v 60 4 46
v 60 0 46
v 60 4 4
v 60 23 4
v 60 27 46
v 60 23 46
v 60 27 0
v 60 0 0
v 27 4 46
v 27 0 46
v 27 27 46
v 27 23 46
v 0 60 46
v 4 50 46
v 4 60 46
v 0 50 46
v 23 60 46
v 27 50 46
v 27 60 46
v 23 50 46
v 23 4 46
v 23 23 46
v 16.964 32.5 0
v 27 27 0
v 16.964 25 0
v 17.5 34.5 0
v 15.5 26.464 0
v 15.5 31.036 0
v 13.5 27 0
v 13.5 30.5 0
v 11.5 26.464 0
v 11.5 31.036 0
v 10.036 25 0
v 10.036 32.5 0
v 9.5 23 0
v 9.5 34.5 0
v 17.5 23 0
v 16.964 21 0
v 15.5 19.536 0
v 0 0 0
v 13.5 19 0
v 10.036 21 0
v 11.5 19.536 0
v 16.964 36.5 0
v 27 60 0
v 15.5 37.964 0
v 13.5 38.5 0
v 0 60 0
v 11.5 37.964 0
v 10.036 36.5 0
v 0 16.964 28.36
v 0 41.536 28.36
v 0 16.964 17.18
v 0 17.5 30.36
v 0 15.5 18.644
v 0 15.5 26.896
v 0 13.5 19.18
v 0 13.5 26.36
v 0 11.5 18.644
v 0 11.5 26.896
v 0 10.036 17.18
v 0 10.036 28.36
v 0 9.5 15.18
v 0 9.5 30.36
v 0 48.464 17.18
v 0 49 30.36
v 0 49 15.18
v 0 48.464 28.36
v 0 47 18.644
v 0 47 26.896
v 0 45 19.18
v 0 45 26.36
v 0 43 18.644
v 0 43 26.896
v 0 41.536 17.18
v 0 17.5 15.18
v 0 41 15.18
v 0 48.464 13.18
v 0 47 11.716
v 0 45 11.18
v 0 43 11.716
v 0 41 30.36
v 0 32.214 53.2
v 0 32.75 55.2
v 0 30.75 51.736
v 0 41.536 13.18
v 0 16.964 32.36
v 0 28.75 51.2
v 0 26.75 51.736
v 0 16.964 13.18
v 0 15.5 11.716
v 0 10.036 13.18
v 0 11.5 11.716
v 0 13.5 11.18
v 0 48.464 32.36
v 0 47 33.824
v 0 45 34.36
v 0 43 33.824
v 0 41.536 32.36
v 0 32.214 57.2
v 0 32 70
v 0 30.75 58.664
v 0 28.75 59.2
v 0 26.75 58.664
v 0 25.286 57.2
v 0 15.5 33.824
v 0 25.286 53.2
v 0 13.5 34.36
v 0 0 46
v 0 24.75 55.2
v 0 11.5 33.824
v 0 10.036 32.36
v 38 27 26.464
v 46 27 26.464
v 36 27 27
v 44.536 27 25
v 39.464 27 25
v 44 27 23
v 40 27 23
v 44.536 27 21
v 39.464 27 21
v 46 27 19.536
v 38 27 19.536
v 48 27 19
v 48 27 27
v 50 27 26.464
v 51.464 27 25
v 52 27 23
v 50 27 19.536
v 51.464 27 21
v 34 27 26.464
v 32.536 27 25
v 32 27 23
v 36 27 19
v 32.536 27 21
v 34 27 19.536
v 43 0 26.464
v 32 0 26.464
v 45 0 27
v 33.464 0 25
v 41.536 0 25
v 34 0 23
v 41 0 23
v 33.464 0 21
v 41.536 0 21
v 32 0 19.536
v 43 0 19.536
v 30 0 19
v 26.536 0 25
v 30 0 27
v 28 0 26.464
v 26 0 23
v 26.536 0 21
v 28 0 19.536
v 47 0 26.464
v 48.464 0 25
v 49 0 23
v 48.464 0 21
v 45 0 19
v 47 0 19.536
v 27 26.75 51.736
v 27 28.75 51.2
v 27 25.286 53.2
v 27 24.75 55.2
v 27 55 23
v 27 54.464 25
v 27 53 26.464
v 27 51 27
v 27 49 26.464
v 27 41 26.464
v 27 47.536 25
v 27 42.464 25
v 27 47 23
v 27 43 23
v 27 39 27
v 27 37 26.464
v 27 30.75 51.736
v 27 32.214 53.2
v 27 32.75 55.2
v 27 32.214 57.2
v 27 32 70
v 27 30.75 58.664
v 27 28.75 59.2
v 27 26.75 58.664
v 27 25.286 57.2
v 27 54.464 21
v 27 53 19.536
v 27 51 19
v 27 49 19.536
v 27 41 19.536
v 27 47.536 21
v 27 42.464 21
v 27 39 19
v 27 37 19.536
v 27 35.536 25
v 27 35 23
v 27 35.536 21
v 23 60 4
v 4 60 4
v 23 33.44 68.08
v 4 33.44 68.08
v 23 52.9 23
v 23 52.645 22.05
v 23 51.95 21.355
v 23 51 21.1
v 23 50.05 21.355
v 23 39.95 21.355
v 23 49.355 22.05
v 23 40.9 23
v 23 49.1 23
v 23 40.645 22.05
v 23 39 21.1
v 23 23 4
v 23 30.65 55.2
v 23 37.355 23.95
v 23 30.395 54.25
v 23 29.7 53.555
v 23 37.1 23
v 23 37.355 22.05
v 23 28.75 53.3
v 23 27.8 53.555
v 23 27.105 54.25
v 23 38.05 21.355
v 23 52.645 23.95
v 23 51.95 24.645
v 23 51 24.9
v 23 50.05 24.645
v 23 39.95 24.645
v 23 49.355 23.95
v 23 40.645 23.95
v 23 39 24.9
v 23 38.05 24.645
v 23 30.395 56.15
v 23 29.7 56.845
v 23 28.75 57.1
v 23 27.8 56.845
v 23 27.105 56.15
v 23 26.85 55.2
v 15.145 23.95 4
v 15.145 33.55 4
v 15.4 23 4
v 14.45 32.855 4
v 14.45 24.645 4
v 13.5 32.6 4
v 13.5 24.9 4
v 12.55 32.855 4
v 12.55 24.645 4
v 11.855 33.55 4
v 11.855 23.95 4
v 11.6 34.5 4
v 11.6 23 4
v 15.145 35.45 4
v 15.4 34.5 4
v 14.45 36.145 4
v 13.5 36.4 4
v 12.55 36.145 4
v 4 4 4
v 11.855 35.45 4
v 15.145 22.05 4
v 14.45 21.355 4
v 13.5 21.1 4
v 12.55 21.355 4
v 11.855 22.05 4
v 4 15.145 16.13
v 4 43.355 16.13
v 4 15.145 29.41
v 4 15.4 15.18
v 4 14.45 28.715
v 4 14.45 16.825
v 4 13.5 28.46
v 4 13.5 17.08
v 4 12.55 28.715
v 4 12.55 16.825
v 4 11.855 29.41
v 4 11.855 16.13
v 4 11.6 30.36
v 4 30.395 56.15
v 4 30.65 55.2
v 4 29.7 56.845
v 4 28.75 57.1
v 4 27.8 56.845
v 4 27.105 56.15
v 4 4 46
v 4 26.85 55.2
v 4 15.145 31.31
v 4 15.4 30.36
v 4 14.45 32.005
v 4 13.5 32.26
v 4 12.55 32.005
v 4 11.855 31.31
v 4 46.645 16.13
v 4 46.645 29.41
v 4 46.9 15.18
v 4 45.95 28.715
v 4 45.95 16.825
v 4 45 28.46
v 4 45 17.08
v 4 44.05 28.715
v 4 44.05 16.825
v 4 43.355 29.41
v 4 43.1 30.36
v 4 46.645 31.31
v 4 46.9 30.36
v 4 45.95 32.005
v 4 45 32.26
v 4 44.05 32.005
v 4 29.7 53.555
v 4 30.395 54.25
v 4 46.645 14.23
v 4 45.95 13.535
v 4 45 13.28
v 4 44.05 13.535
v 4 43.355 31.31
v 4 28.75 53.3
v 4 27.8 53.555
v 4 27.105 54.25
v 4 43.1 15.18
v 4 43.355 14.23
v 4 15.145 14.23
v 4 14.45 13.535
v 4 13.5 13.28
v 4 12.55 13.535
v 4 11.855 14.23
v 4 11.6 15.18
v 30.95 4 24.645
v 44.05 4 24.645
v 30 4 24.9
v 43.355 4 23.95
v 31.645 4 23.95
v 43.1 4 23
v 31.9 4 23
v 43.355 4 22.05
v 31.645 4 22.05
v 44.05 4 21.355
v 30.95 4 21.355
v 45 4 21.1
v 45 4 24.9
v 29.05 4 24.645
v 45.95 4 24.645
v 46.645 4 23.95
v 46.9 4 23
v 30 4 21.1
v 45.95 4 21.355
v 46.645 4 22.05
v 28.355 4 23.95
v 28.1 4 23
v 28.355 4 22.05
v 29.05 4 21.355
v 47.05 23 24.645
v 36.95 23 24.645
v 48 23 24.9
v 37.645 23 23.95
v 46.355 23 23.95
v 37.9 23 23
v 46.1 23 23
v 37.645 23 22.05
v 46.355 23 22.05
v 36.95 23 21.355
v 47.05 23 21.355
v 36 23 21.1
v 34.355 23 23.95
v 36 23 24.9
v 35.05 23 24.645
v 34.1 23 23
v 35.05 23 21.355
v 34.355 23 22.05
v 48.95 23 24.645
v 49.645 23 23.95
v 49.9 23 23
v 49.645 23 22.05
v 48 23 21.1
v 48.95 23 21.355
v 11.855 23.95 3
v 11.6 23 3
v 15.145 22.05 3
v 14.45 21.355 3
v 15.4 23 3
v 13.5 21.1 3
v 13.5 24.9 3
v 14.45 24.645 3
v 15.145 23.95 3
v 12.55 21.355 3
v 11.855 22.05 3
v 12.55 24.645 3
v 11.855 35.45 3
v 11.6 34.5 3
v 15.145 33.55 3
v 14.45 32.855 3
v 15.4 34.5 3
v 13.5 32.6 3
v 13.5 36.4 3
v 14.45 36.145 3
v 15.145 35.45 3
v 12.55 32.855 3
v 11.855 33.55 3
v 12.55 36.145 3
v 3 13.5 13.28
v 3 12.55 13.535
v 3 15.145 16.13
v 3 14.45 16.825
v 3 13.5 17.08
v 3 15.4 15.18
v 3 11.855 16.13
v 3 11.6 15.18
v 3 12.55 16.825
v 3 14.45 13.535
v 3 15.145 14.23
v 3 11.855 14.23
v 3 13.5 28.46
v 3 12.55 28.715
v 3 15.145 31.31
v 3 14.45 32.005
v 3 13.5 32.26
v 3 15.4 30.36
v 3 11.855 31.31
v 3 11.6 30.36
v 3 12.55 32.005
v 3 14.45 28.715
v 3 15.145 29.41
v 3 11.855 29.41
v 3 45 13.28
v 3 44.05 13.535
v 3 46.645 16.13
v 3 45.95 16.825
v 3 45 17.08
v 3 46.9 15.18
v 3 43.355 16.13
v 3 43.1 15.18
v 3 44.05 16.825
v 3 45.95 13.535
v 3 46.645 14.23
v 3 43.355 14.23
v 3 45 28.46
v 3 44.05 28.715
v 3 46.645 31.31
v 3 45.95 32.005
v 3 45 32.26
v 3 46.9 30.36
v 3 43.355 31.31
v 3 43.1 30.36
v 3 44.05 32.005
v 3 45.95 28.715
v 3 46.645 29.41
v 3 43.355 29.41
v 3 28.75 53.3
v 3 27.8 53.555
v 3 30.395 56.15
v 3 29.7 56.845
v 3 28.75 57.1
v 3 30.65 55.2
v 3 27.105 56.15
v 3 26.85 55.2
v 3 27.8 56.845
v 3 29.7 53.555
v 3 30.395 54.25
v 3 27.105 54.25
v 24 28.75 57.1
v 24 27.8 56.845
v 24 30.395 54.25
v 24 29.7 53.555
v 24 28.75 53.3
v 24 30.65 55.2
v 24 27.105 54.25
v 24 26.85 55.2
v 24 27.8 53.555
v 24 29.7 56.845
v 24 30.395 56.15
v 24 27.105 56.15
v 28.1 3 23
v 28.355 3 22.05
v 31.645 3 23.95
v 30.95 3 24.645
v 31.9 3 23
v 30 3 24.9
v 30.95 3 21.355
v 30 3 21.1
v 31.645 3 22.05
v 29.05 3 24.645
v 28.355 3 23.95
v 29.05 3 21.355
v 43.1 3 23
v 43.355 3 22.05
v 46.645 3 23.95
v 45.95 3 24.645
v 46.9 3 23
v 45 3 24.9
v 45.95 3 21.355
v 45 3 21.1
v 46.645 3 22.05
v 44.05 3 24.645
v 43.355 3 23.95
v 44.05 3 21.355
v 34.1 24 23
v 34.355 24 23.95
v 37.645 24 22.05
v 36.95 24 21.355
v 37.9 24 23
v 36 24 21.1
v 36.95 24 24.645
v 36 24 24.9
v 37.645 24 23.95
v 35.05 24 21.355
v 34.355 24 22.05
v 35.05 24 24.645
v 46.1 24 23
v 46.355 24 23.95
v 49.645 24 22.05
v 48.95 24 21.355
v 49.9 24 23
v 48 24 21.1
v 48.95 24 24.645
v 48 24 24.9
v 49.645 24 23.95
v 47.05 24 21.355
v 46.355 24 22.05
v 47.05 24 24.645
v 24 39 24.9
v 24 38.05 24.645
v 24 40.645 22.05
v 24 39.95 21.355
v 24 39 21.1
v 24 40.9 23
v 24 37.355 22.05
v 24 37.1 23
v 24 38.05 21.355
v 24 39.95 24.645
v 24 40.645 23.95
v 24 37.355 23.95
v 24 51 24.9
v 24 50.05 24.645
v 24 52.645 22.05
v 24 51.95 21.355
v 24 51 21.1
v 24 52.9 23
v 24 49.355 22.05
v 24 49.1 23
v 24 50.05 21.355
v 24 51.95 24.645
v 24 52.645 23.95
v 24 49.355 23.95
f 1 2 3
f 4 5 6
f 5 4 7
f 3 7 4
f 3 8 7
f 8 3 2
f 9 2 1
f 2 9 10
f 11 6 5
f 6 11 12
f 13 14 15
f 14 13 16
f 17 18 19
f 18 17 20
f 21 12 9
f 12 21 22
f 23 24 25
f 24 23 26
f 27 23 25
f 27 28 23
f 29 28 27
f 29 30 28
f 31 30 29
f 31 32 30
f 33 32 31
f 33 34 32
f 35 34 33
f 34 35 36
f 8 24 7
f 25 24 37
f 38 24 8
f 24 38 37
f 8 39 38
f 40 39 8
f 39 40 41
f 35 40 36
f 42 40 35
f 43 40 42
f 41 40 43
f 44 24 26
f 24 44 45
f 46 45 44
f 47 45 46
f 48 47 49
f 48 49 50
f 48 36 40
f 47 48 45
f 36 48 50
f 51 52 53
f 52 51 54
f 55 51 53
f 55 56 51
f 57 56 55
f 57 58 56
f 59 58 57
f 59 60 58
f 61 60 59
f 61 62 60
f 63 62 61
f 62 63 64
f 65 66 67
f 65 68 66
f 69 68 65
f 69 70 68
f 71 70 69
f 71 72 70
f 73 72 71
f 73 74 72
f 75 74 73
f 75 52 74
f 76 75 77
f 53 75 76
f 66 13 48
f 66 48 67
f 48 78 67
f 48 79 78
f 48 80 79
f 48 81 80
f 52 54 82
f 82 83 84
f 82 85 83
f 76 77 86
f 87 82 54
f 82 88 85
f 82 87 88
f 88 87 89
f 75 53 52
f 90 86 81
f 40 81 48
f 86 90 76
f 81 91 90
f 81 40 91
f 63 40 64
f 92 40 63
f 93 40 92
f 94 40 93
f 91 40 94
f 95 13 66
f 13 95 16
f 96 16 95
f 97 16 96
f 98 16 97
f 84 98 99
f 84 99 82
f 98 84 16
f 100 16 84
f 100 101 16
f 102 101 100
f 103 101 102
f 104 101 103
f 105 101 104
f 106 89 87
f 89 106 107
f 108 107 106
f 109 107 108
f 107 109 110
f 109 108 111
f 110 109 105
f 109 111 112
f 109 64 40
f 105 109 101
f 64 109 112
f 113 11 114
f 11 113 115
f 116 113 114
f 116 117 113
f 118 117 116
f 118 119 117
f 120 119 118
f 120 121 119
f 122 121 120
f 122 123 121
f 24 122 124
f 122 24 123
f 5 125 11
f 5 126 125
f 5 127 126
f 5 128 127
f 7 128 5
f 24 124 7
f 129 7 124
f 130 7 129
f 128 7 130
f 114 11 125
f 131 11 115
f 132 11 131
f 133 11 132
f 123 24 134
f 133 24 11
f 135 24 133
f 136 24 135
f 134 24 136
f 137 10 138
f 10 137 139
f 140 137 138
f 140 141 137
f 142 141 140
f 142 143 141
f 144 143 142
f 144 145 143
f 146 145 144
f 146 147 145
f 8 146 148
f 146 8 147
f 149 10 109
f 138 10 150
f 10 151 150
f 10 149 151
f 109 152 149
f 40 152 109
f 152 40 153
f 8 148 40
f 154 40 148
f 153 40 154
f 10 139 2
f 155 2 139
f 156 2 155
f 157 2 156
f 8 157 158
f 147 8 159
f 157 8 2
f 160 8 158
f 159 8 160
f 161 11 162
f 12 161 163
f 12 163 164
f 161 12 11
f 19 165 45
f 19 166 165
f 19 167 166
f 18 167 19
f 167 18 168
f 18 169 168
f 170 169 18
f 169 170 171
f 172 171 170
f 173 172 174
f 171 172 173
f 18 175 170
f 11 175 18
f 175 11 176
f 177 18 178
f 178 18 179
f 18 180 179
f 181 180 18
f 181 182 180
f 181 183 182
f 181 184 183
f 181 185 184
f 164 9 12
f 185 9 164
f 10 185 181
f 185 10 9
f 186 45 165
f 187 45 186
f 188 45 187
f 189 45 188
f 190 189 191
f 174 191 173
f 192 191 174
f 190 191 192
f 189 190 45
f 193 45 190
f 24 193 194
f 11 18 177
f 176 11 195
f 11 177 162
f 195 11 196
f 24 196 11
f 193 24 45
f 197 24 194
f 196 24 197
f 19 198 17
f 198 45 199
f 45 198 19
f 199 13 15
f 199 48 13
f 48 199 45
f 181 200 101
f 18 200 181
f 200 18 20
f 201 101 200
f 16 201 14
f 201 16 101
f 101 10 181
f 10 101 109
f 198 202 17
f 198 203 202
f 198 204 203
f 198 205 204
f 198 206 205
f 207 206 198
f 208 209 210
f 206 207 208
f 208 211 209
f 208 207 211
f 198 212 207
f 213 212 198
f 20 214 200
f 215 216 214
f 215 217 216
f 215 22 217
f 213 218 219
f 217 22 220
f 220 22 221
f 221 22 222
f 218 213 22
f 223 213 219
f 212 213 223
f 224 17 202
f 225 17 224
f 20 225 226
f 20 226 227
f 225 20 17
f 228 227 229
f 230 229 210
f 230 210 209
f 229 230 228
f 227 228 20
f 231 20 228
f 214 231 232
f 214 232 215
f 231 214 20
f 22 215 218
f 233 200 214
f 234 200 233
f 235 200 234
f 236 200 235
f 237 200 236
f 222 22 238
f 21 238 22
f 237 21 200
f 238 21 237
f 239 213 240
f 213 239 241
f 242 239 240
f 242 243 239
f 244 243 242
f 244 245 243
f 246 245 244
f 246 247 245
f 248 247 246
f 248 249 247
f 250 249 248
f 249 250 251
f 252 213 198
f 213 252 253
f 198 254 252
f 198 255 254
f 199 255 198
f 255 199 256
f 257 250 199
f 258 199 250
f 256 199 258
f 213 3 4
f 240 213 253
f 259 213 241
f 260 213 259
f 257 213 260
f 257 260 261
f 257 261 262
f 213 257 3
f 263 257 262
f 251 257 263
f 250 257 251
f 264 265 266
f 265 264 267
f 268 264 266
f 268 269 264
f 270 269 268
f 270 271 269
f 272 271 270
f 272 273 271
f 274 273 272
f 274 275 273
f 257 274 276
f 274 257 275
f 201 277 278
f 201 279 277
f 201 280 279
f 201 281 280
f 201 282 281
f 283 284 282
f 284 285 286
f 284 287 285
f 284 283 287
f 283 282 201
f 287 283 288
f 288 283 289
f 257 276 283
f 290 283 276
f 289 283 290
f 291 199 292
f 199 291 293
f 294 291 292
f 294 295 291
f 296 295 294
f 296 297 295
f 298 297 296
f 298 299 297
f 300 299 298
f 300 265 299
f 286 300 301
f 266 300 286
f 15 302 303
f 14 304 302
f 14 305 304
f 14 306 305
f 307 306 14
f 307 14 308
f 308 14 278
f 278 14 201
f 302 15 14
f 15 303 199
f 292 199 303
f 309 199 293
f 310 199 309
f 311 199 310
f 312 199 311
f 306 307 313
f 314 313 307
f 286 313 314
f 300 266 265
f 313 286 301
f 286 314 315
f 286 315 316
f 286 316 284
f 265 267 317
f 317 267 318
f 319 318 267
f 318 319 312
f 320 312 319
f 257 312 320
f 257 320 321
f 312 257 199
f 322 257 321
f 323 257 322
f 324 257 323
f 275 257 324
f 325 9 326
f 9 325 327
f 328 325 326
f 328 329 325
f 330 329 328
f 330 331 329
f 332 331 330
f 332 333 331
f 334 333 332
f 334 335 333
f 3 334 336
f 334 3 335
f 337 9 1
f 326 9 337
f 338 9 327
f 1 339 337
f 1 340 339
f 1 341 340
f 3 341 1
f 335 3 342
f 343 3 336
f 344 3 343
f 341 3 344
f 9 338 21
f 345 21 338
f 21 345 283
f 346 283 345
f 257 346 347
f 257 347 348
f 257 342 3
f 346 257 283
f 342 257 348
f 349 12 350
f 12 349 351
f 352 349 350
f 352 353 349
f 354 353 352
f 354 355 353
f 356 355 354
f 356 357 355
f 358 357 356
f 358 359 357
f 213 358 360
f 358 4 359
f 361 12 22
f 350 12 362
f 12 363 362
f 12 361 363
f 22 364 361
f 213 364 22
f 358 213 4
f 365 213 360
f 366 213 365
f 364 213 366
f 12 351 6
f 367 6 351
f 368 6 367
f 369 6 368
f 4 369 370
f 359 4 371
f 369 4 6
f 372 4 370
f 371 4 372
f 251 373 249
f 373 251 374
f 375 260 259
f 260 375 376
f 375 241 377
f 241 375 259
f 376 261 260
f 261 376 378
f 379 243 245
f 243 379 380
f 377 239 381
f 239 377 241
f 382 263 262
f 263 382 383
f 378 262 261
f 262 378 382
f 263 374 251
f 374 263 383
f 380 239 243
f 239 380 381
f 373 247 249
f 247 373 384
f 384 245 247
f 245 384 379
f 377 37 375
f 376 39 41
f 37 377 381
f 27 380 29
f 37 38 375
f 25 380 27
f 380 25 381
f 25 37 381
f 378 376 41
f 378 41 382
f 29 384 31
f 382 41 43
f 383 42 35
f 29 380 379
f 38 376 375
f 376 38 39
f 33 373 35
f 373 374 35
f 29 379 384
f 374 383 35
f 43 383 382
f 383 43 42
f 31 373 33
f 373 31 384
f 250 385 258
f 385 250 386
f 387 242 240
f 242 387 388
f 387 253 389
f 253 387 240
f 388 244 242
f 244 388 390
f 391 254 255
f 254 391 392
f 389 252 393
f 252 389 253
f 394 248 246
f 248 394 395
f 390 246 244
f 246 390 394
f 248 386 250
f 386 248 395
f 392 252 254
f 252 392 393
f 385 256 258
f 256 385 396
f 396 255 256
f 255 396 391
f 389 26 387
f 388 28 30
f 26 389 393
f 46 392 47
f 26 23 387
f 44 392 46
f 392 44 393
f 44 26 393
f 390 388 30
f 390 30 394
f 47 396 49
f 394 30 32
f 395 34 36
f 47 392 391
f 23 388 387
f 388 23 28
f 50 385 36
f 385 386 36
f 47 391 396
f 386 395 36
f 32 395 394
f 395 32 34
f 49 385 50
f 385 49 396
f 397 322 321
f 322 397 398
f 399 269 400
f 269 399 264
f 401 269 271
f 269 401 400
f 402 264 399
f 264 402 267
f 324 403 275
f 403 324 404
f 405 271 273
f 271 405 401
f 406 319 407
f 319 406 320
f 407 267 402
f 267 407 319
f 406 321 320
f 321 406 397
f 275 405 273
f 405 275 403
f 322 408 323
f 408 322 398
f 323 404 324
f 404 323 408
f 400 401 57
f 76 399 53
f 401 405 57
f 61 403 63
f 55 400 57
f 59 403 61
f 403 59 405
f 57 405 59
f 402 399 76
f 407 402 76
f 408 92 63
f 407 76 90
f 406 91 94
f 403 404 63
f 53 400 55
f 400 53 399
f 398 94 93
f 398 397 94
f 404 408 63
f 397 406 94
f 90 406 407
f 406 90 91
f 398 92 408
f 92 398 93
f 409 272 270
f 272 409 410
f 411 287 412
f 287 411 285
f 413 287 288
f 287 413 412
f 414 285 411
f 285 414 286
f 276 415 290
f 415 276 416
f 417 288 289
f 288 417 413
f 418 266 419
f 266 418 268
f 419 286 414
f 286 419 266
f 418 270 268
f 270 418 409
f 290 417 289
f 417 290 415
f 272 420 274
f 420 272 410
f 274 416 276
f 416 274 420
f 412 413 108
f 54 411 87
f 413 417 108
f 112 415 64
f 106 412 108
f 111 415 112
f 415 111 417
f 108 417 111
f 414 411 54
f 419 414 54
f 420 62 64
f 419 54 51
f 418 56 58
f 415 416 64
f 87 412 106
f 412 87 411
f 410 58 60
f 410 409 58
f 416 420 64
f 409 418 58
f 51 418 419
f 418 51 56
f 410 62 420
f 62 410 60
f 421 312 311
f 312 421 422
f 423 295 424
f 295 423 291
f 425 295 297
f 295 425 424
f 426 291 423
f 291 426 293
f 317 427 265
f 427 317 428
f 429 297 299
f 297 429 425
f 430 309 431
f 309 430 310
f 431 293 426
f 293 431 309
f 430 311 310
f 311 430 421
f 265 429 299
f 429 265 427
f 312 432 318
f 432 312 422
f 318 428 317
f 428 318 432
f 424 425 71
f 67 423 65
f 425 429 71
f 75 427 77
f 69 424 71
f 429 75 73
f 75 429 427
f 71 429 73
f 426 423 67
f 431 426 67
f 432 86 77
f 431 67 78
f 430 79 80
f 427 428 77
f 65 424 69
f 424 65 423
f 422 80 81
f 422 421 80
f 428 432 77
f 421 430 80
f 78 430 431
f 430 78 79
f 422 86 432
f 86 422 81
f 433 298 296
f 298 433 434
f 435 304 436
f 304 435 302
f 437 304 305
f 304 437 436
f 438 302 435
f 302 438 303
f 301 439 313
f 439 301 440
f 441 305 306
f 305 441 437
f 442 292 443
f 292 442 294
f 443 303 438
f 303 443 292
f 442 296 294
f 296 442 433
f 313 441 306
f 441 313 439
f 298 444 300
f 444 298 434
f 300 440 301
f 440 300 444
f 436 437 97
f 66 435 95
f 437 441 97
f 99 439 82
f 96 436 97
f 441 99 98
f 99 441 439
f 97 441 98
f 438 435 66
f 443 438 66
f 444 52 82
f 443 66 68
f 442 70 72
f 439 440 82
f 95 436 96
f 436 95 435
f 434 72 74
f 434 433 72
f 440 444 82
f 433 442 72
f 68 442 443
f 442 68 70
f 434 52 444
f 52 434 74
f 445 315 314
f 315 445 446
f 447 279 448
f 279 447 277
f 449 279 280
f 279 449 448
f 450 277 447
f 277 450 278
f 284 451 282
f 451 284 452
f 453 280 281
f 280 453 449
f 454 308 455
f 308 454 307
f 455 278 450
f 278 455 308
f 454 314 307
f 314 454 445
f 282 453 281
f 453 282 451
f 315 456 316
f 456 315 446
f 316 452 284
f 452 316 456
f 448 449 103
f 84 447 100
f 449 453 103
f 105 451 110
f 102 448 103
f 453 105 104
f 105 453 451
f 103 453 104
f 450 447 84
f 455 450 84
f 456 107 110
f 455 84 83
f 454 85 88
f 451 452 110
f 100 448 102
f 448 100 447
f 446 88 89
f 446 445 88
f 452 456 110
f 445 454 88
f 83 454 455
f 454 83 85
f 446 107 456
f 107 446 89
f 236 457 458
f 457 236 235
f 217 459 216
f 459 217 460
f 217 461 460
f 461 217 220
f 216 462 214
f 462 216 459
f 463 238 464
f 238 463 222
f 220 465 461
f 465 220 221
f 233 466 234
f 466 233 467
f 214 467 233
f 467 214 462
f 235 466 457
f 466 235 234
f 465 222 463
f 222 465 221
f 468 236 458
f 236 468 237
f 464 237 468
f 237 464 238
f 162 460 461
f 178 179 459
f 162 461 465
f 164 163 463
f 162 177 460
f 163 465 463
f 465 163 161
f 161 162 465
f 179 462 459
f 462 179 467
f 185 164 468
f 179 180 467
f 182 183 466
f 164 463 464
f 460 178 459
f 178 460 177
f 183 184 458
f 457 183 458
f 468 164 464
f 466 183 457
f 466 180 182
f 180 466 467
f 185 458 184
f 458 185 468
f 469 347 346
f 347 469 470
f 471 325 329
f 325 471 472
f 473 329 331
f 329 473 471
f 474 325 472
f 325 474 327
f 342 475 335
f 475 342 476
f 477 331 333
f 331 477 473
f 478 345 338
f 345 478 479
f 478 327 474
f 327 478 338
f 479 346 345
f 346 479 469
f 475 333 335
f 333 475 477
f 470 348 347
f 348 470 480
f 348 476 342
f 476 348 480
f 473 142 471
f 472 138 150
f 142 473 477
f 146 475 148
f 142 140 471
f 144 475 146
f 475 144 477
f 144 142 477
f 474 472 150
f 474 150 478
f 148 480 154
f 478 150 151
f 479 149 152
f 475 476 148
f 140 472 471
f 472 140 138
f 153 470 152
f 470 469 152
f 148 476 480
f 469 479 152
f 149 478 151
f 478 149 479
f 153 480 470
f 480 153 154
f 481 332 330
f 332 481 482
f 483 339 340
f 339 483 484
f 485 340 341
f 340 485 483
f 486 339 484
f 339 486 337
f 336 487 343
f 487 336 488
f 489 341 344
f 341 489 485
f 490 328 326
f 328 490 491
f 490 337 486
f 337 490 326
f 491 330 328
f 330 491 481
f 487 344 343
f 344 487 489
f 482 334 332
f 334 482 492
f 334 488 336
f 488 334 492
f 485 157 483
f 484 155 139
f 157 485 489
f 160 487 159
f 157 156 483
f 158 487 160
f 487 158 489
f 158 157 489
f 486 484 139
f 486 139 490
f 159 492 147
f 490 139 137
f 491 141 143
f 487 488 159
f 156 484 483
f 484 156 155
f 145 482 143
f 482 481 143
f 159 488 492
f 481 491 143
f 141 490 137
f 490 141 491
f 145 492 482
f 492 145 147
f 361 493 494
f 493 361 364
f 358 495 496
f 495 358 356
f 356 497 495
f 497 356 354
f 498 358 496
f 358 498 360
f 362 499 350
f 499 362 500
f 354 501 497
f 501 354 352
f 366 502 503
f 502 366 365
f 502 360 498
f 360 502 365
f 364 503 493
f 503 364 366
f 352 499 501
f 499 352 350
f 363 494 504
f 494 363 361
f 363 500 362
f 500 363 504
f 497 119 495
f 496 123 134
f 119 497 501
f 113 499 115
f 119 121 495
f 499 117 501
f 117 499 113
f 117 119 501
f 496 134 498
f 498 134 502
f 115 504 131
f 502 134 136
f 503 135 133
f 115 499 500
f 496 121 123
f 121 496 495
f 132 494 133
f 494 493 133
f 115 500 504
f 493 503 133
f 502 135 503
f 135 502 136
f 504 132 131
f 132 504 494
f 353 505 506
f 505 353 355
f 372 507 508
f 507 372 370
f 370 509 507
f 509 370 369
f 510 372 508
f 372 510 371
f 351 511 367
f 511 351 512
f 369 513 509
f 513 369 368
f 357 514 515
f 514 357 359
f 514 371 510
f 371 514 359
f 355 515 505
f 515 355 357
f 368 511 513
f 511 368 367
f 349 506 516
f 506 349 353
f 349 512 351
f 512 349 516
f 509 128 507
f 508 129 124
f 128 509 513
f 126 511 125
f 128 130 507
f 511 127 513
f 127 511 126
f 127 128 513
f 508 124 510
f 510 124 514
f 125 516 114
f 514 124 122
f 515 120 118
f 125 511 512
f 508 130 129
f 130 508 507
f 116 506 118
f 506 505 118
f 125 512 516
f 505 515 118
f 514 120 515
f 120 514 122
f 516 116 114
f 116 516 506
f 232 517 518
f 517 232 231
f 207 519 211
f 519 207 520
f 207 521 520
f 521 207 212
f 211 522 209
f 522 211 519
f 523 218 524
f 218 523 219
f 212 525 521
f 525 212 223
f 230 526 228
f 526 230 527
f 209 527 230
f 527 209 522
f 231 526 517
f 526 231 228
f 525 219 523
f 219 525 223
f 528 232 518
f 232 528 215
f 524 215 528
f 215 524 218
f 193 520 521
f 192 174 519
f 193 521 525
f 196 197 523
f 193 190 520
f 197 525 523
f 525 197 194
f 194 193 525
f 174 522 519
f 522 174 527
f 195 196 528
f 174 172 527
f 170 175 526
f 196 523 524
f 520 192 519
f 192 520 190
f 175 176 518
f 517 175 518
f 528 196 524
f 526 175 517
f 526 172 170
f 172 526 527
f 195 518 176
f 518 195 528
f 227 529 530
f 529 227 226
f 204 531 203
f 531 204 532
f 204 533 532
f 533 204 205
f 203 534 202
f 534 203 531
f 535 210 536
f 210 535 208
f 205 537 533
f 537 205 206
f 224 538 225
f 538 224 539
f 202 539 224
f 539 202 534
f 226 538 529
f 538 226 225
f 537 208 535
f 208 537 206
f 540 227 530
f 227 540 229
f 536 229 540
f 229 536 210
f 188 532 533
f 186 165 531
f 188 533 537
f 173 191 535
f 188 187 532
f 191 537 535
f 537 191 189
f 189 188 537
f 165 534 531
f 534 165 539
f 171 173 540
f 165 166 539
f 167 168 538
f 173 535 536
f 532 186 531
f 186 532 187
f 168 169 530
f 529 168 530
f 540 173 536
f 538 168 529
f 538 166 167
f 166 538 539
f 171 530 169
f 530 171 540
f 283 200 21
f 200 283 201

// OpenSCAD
difference(){
	union() {
		cube(size = [60, 27, 46]);
		cube(size = [27, 60, 46]);
		translate(v = [0, 0, 46]) {
			rotate(a = -53.1300000000, v = [1, 0, 0]) {
				translate(v = [0, 0, 0]) {
					cube(size = [27, 36, 40]);
				}
			}
		}
		translate(v = [13.5000000000, 23.0000000000, 0]) {
			rotate(a = 180, v = [1, 0, 0]) {
			}
		}
		translate(v = [13.5000000000, 34.5000000000, 0]) {
			rotate(a = 180, v = [1, 0, 0]) {
			}
		}
		translate(v = [0, 13.5000000000, 15.1800000000]) {
			rotate(a = -90, v = [0, 1, 0]) {
			}
		}
		translate(v = [0, 13.5000000000, 30.3600000000]) {
			rotate(a = -90, v = [0, 1, 0]) {
			}
		}
		translate(v = [0, 45.0000000000, 15.1800000000]) {
			rotate(a = -90, v = [0, 1, 0]) {
			}
		}
		translate(v = [0, 45.0000000000, 30.3600000000]) {
			rotate(a = -90, v = [0, 1, 0]) {
			}
		}
		translate(v = [0, 28.7500000000, 55.2000000000]) {
			rotate(a = -90, v = [0, 1, 0]) {
			}
		}
		translate(v = [27, 28.7500000000, 55.2000000000]) {
			rotate(a = 90, v = [0, 1, 0]) {
			}
		}
		translate(v = [30.0000000000, 0, 23.0000000000]) {
			rotate(a = 90, v = [1, 0, 0]) {
			}
		}
		translate(v = [45.0000000000, 0, 23.0000000000]) {
			rotate(a = 90, v = [1, 0, 0]) {
			}
		}
		translate(v = [36.0000000000, 27, 23.0000000000]) {
			rotate(a = -90, v = [1, 0, 0]) {
			}
		}
		translate(v = [48.0000000000, 27, 23.0000000000]) {
			rotate(a = -90, v = [1, 0, 0]) {
			}
		}
		translate(v = [27, 39.0000000000, 23.0000000000]) {
			rotate(a = 90, v = [0, 1, 0]) {
			}
		}
		translate(v = [27, 51.0000000000, 23.0000000000]) {
			rotate(a = 90, v = [0, 1, 0]) {
			}
		}
	}
	/* Holes Below*/
	union(){
		translate(v = [4, 4, 4]) {
			cube(size = [19, 60, 42]);
			cube(size = [60, 19, 42]);
		}
		translate(v = [4, 4, 46]) {
			rotate(a = -53.1300000000, v = [1, 0, 0]) {
				translate(v = [0, 0, 0]) {
					cube(size = [19, 50, 38]);
				}
			}
		}
		translate(v = [13.5000000000, 23.0000000000, 0]){
			rotate(a = 180, v = [1, 0, 0]){
				union() {
					union() {
						translate(v = [0, 0, -5]) {
							cylinder($fn = 12, h = 5, r = 1.9000000000);
						}
						translate(v = [0, 0, -3]) {
							cylinder($fn = 12, h = 3, r1 = 1.9000000000, r2 = 4);
						}
					}
					cylinder($fn = 12, h = 1, r = 4);
				}
			}
		}
		translate(v = [13.5000000000, 34.5000000000, 0]){
			rotate(a = 180, v = [1, 0, 0]){
				union() {
					union() {
						translate(v = [0, 0, -5]) {
							cylinder($fn = 12, h = 5, r = 1.9000000000);
						}
						translate(v = [0, 0, -3]) {
							cylinder($fn = 12, h = 3, r1 = 1.9000000000, r2 = 4);
						}
					}
					cylinder($fn = 12, h = 1, r = 4);
				}
			}
		}
		translate(v = [0, 13.5000000000, 15.1800000000]){
			rotate(a = -90, v = [0, 1, 0]){
				union() {
					union() {
						translate(v = [0, 0, -5]) {
							cylinder($fn = 12, h = 5, r = 1.9000000000);
						}
						translate(v = [0, 0, -3]) {
							cylinder($fn = 12, h = 3, r1 = 1.9000000000, r2 = 4);
						}
					}
					cylinder($fn = 12, h = 1, r = 4);
				}
			}
		}
		translate(v = [0, 13.5000000000, 30.3600000000]){
			rotate(a = -90, v = [0, 1, 0]){
				union() {
					union() {
						translate(v = [0, 0, -5]) {
							cylinder($fn = 12, h = 5, r = 1.9000000000);
						}
						translate(v = [0, 0, -3]) {
							cylinder($fn = 12, h = 3, r1 = 1.9000000000, r2 = 4);
						}
					}
					cylinder($fn = 12, h = 1, r = 4);
				}
			}
		}
		translate(v = [0, 45.0000000000, 15.1800000000]){
			rotate(a = -90, v = [0, 1, 0]){
				union() {
					union() {
						translate(v = [0, 0, -5]) {
							cylinder($fn = 12, h = 5, r = 1.9000000000);
						}
						translate(v = [0, 0, -3]) {
							cylinder($fn = 12, h = 3, r1 = 1.9000000000, r2 = 4);
						}
					}
					cylinder($fn = 12, h = 1, r = 4);
				}
			}
		}
		translate(v = [0, 45.0000000000, 30.3600000000]){
			rotate(a = -90, v = [0, 1, 0]){
				union() {
					union() {
						translate(v = [0, 0, -5]) {
							cylinder($fn = 12, h = 5, r = 1.9000000000);
						}
						translate(v = [0, 0, -3]) {
							cylinder($fn = 12, h = 3, r1 = 1.9000000000, r2 = 4);
						}
					}
					cylinder($fn = 12, h = 1, r = 4);
				}
			}
		}
		translate(v = [0, 28.7500000000, 55.2000000000]){
			rotate(a = -90, v = [0, 1, 0]){
				union() {
					union() {
						translate(v = [0, 0, -5]) {
							cylinder($fn = 12, h = 5, r = 1.9000000000);
						}
						translate(v = [0, 0, -3]) {
							cylinder($fn = 12, h = 3, r1 = 1.9000000000, r2 = 4);
						}
					}
					cylinder($fn = 12, h = 1, r = 4);
				}
			}
		}
		translate(v = [27, 28.7500000000, 55.2000000000]){
			rotate(a = 90, v = [0, 1, 0]){
				union() {
					union() {
						translate(v = [0, 0, -5]) {
							cylinder($fn = 12, h = 5, r = 1.9000000000);
						}
						translate(v = [0, 0, -3]) {
							cylinder($fn = 12, h = 3, r1 = 1.9000000000, r2 = 4);
						}
					}
					cylinder($fn = 12, h = 1, r = 4);
				}
			}
		}
		translate(v = [30.0000000000, 0, 23.0000000000]){
			rotate(a = 90, v = [1, 0, 0]){
				union() {
					union() {
						translate(v = [0, 0, -5]) {
							cylinder($fn = 12, h = 5, r = 1.9000000000);
						}
						translate(v = [0, 0, -3]) {
							cylinder($fn = 12, h = 3, r1 = 1.9000000000, r2 = 4);
						}
					}
					cylinder($fn = 12, h = 1, r = 4);
				}
			}
		}
		translate(v = [45.0000000000, 0, 23.0000000000]){
			rotate(a = 90, v = [1, 0, 0]){
				union() {
					union() {
						translate(v = [0, 0, -5]) {
							cylinder($fn = 12, h = 5, r = 1.9000000000);
						}
						translate(v = [0, 0, -3]) {
							cylinder($fn = 12, h = 3, r1 = 1.9000000000, r2 = 4);
						}
					}
					cylinder($fn = 12, h = 1, r = 4);
				}
			}
		}
		translate(v = [36.0000000000, 27, 23.0000000000]){
			rotate(a = -90, v = [1, 0, 0]){
				union() {
					union() {
						translate(v = [0, 0, -5]) {
							cylinder($fn = 12, h = 5, r = 1.9000000000);
						}
						translate(v = [0, 0, -3]) {
							cylinder($fn = 12, h = 3, r1 = 1.9000000000, r2 = 4);
						}
					}
					cylinder($fn = 12, h = 1, r = 4);
				}
			}
		}
		translate(v = [48.0000000000, 27, 23.0000000000]){
			rotate(a = -90, v = [1, 0, 0]){
				union() {
					union() {
						translate(v = [0, 0, -5]) {
							cylinder($fn = 12, h = 5, r = 1.9000000000);
						}
						translate(v = [0, 0, -3]) {
							cylinder($fn = 12, h = 3, r1 = 1.9000000000, r2 = 4);
						}
					}
					cylinder($fn = 12, h = 1, r = 4);
				}
			}
		}
		translate(v = [27, 39.0000000000, 23.0000000000]){
			rotate(a = 90, v = [0, 1, 0]){
				union() {
					union() {
						translate(v = [0, 0, -5]) {
							cylinder($fn = 12, h = 5, r = 1.9000000000);
						}
						translate(v = [0, 0, -3]) {
							cylinder($fn = 12, h = 3, r1 = 1.9000000000, r2 = 4);
						}
					}
					cylinder($fn = 12, h = 1, r = 4);
				}
			}
		}
		translate(v = [27, 51.0000000000, 23.0000000000]){
			rotate(a = 90, v = [0, 1, 0]){
				union() {
					union() {
						translate(v = [0, 0, -5]) {
							cylinder($fn = 12, h = 5, r = 1.9000000000);
						}
						translate(v = [0, 0, -3]) {
							cylinder($fn = 12, h = 3, r1 = 1.9000000000, r2 = 4);
						}
					}
					cylinder($fn = 12, h = 1, r = 4);
				}
			}
		}
	} /* End Holes */ 
}
